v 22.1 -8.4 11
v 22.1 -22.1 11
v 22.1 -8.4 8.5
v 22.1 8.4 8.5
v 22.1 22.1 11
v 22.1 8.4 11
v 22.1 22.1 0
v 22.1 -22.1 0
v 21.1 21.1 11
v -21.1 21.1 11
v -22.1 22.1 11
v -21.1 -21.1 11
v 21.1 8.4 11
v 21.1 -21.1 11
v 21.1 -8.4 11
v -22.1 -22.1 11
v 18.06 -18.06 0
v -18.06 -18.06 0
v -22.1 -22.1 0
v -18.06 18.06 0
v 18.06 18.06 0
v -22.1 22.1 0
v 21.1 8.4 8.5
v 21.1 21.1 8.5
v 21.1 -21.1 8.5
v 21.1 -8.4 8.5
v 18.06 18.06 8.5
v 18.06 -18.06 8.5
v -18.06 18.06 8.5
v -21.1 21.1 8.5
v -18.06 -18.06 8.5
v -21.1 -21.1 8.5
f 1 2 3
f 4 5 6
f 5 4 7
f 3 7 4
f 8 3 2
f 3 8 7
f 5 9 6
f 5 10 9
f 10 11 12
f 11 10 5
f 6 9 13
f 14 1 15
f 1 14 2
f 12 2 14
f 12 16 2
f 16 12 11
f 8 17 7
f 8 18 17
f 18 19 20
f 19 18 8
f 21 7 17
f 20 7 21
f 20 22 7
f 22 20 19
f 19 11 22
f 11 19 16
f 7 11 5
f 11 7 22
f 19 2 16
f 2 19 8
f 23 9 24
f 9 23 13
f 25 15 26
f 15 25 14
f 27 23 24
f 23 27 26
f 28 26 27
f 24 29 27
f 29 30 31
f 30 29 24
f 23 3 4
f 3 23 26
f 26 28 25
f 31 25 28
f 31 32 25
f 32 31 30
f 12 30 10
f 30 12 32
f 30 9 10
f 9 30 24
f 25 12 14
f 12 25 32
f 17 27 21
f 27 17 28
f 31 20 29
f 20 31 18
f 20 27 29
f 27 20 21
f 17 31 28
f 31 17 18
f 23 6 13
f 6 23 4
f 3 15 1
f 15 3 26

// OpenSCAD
//  NEMA Stepper Motor Customizable Height Stand
//
//  I only had a 40mm stepper but needed a 48mm
//  for the Z axis on a reprap Wilson TS.  With 
//  the 40mm it was unstable until I printed this
//  stand.  Problem solved.
//  
//  I printed in PLA .3 layer height, .2 fill
//
//  aBrainDump.com
//
//
// specify the motor size and the height in mm you 
// would like to add.  I had a 40mm and needed a 48mm.
// I entered 8mm for the height
//

// Stand height
base_height_in_mm = 8;

// Choose the stepper motor
width_in_mm = 42; //[35.2:NEMA14, 42:NEMA17, 57:NEMA23]

// Top edge height
edge_height_in_mm = 3;



difference(){
//outer shell
translate([0,0,(base_height_in_mm+edge_height_in_mm)/2])
cube([width_in_mm+2.2,width_in_mm+2.2,edge_height_in_mm+base_height_in_mm], center = true);

//inside edge
translate([0,0,base_height_in_mm+edge_height_in_mm-1])
cube([width_in_mm+.2,width_in_mm+.2,edge_height_in_mm], center = true);

// center hole to reduce material
translate([0,0,0])
cube([width_in_mm*.86,width_in_mm*.86,50+base_height_in_mm], center = true);

// notch for wiring harness height_in_mm+(edge_height_in_mm/2
translate([width_in_mm/2,0,4+(base_height_in_mm+edge_height_in_mm/2)])
cube([width_in_mm*.4,width_in_mm*.4,10], center = true);
}
